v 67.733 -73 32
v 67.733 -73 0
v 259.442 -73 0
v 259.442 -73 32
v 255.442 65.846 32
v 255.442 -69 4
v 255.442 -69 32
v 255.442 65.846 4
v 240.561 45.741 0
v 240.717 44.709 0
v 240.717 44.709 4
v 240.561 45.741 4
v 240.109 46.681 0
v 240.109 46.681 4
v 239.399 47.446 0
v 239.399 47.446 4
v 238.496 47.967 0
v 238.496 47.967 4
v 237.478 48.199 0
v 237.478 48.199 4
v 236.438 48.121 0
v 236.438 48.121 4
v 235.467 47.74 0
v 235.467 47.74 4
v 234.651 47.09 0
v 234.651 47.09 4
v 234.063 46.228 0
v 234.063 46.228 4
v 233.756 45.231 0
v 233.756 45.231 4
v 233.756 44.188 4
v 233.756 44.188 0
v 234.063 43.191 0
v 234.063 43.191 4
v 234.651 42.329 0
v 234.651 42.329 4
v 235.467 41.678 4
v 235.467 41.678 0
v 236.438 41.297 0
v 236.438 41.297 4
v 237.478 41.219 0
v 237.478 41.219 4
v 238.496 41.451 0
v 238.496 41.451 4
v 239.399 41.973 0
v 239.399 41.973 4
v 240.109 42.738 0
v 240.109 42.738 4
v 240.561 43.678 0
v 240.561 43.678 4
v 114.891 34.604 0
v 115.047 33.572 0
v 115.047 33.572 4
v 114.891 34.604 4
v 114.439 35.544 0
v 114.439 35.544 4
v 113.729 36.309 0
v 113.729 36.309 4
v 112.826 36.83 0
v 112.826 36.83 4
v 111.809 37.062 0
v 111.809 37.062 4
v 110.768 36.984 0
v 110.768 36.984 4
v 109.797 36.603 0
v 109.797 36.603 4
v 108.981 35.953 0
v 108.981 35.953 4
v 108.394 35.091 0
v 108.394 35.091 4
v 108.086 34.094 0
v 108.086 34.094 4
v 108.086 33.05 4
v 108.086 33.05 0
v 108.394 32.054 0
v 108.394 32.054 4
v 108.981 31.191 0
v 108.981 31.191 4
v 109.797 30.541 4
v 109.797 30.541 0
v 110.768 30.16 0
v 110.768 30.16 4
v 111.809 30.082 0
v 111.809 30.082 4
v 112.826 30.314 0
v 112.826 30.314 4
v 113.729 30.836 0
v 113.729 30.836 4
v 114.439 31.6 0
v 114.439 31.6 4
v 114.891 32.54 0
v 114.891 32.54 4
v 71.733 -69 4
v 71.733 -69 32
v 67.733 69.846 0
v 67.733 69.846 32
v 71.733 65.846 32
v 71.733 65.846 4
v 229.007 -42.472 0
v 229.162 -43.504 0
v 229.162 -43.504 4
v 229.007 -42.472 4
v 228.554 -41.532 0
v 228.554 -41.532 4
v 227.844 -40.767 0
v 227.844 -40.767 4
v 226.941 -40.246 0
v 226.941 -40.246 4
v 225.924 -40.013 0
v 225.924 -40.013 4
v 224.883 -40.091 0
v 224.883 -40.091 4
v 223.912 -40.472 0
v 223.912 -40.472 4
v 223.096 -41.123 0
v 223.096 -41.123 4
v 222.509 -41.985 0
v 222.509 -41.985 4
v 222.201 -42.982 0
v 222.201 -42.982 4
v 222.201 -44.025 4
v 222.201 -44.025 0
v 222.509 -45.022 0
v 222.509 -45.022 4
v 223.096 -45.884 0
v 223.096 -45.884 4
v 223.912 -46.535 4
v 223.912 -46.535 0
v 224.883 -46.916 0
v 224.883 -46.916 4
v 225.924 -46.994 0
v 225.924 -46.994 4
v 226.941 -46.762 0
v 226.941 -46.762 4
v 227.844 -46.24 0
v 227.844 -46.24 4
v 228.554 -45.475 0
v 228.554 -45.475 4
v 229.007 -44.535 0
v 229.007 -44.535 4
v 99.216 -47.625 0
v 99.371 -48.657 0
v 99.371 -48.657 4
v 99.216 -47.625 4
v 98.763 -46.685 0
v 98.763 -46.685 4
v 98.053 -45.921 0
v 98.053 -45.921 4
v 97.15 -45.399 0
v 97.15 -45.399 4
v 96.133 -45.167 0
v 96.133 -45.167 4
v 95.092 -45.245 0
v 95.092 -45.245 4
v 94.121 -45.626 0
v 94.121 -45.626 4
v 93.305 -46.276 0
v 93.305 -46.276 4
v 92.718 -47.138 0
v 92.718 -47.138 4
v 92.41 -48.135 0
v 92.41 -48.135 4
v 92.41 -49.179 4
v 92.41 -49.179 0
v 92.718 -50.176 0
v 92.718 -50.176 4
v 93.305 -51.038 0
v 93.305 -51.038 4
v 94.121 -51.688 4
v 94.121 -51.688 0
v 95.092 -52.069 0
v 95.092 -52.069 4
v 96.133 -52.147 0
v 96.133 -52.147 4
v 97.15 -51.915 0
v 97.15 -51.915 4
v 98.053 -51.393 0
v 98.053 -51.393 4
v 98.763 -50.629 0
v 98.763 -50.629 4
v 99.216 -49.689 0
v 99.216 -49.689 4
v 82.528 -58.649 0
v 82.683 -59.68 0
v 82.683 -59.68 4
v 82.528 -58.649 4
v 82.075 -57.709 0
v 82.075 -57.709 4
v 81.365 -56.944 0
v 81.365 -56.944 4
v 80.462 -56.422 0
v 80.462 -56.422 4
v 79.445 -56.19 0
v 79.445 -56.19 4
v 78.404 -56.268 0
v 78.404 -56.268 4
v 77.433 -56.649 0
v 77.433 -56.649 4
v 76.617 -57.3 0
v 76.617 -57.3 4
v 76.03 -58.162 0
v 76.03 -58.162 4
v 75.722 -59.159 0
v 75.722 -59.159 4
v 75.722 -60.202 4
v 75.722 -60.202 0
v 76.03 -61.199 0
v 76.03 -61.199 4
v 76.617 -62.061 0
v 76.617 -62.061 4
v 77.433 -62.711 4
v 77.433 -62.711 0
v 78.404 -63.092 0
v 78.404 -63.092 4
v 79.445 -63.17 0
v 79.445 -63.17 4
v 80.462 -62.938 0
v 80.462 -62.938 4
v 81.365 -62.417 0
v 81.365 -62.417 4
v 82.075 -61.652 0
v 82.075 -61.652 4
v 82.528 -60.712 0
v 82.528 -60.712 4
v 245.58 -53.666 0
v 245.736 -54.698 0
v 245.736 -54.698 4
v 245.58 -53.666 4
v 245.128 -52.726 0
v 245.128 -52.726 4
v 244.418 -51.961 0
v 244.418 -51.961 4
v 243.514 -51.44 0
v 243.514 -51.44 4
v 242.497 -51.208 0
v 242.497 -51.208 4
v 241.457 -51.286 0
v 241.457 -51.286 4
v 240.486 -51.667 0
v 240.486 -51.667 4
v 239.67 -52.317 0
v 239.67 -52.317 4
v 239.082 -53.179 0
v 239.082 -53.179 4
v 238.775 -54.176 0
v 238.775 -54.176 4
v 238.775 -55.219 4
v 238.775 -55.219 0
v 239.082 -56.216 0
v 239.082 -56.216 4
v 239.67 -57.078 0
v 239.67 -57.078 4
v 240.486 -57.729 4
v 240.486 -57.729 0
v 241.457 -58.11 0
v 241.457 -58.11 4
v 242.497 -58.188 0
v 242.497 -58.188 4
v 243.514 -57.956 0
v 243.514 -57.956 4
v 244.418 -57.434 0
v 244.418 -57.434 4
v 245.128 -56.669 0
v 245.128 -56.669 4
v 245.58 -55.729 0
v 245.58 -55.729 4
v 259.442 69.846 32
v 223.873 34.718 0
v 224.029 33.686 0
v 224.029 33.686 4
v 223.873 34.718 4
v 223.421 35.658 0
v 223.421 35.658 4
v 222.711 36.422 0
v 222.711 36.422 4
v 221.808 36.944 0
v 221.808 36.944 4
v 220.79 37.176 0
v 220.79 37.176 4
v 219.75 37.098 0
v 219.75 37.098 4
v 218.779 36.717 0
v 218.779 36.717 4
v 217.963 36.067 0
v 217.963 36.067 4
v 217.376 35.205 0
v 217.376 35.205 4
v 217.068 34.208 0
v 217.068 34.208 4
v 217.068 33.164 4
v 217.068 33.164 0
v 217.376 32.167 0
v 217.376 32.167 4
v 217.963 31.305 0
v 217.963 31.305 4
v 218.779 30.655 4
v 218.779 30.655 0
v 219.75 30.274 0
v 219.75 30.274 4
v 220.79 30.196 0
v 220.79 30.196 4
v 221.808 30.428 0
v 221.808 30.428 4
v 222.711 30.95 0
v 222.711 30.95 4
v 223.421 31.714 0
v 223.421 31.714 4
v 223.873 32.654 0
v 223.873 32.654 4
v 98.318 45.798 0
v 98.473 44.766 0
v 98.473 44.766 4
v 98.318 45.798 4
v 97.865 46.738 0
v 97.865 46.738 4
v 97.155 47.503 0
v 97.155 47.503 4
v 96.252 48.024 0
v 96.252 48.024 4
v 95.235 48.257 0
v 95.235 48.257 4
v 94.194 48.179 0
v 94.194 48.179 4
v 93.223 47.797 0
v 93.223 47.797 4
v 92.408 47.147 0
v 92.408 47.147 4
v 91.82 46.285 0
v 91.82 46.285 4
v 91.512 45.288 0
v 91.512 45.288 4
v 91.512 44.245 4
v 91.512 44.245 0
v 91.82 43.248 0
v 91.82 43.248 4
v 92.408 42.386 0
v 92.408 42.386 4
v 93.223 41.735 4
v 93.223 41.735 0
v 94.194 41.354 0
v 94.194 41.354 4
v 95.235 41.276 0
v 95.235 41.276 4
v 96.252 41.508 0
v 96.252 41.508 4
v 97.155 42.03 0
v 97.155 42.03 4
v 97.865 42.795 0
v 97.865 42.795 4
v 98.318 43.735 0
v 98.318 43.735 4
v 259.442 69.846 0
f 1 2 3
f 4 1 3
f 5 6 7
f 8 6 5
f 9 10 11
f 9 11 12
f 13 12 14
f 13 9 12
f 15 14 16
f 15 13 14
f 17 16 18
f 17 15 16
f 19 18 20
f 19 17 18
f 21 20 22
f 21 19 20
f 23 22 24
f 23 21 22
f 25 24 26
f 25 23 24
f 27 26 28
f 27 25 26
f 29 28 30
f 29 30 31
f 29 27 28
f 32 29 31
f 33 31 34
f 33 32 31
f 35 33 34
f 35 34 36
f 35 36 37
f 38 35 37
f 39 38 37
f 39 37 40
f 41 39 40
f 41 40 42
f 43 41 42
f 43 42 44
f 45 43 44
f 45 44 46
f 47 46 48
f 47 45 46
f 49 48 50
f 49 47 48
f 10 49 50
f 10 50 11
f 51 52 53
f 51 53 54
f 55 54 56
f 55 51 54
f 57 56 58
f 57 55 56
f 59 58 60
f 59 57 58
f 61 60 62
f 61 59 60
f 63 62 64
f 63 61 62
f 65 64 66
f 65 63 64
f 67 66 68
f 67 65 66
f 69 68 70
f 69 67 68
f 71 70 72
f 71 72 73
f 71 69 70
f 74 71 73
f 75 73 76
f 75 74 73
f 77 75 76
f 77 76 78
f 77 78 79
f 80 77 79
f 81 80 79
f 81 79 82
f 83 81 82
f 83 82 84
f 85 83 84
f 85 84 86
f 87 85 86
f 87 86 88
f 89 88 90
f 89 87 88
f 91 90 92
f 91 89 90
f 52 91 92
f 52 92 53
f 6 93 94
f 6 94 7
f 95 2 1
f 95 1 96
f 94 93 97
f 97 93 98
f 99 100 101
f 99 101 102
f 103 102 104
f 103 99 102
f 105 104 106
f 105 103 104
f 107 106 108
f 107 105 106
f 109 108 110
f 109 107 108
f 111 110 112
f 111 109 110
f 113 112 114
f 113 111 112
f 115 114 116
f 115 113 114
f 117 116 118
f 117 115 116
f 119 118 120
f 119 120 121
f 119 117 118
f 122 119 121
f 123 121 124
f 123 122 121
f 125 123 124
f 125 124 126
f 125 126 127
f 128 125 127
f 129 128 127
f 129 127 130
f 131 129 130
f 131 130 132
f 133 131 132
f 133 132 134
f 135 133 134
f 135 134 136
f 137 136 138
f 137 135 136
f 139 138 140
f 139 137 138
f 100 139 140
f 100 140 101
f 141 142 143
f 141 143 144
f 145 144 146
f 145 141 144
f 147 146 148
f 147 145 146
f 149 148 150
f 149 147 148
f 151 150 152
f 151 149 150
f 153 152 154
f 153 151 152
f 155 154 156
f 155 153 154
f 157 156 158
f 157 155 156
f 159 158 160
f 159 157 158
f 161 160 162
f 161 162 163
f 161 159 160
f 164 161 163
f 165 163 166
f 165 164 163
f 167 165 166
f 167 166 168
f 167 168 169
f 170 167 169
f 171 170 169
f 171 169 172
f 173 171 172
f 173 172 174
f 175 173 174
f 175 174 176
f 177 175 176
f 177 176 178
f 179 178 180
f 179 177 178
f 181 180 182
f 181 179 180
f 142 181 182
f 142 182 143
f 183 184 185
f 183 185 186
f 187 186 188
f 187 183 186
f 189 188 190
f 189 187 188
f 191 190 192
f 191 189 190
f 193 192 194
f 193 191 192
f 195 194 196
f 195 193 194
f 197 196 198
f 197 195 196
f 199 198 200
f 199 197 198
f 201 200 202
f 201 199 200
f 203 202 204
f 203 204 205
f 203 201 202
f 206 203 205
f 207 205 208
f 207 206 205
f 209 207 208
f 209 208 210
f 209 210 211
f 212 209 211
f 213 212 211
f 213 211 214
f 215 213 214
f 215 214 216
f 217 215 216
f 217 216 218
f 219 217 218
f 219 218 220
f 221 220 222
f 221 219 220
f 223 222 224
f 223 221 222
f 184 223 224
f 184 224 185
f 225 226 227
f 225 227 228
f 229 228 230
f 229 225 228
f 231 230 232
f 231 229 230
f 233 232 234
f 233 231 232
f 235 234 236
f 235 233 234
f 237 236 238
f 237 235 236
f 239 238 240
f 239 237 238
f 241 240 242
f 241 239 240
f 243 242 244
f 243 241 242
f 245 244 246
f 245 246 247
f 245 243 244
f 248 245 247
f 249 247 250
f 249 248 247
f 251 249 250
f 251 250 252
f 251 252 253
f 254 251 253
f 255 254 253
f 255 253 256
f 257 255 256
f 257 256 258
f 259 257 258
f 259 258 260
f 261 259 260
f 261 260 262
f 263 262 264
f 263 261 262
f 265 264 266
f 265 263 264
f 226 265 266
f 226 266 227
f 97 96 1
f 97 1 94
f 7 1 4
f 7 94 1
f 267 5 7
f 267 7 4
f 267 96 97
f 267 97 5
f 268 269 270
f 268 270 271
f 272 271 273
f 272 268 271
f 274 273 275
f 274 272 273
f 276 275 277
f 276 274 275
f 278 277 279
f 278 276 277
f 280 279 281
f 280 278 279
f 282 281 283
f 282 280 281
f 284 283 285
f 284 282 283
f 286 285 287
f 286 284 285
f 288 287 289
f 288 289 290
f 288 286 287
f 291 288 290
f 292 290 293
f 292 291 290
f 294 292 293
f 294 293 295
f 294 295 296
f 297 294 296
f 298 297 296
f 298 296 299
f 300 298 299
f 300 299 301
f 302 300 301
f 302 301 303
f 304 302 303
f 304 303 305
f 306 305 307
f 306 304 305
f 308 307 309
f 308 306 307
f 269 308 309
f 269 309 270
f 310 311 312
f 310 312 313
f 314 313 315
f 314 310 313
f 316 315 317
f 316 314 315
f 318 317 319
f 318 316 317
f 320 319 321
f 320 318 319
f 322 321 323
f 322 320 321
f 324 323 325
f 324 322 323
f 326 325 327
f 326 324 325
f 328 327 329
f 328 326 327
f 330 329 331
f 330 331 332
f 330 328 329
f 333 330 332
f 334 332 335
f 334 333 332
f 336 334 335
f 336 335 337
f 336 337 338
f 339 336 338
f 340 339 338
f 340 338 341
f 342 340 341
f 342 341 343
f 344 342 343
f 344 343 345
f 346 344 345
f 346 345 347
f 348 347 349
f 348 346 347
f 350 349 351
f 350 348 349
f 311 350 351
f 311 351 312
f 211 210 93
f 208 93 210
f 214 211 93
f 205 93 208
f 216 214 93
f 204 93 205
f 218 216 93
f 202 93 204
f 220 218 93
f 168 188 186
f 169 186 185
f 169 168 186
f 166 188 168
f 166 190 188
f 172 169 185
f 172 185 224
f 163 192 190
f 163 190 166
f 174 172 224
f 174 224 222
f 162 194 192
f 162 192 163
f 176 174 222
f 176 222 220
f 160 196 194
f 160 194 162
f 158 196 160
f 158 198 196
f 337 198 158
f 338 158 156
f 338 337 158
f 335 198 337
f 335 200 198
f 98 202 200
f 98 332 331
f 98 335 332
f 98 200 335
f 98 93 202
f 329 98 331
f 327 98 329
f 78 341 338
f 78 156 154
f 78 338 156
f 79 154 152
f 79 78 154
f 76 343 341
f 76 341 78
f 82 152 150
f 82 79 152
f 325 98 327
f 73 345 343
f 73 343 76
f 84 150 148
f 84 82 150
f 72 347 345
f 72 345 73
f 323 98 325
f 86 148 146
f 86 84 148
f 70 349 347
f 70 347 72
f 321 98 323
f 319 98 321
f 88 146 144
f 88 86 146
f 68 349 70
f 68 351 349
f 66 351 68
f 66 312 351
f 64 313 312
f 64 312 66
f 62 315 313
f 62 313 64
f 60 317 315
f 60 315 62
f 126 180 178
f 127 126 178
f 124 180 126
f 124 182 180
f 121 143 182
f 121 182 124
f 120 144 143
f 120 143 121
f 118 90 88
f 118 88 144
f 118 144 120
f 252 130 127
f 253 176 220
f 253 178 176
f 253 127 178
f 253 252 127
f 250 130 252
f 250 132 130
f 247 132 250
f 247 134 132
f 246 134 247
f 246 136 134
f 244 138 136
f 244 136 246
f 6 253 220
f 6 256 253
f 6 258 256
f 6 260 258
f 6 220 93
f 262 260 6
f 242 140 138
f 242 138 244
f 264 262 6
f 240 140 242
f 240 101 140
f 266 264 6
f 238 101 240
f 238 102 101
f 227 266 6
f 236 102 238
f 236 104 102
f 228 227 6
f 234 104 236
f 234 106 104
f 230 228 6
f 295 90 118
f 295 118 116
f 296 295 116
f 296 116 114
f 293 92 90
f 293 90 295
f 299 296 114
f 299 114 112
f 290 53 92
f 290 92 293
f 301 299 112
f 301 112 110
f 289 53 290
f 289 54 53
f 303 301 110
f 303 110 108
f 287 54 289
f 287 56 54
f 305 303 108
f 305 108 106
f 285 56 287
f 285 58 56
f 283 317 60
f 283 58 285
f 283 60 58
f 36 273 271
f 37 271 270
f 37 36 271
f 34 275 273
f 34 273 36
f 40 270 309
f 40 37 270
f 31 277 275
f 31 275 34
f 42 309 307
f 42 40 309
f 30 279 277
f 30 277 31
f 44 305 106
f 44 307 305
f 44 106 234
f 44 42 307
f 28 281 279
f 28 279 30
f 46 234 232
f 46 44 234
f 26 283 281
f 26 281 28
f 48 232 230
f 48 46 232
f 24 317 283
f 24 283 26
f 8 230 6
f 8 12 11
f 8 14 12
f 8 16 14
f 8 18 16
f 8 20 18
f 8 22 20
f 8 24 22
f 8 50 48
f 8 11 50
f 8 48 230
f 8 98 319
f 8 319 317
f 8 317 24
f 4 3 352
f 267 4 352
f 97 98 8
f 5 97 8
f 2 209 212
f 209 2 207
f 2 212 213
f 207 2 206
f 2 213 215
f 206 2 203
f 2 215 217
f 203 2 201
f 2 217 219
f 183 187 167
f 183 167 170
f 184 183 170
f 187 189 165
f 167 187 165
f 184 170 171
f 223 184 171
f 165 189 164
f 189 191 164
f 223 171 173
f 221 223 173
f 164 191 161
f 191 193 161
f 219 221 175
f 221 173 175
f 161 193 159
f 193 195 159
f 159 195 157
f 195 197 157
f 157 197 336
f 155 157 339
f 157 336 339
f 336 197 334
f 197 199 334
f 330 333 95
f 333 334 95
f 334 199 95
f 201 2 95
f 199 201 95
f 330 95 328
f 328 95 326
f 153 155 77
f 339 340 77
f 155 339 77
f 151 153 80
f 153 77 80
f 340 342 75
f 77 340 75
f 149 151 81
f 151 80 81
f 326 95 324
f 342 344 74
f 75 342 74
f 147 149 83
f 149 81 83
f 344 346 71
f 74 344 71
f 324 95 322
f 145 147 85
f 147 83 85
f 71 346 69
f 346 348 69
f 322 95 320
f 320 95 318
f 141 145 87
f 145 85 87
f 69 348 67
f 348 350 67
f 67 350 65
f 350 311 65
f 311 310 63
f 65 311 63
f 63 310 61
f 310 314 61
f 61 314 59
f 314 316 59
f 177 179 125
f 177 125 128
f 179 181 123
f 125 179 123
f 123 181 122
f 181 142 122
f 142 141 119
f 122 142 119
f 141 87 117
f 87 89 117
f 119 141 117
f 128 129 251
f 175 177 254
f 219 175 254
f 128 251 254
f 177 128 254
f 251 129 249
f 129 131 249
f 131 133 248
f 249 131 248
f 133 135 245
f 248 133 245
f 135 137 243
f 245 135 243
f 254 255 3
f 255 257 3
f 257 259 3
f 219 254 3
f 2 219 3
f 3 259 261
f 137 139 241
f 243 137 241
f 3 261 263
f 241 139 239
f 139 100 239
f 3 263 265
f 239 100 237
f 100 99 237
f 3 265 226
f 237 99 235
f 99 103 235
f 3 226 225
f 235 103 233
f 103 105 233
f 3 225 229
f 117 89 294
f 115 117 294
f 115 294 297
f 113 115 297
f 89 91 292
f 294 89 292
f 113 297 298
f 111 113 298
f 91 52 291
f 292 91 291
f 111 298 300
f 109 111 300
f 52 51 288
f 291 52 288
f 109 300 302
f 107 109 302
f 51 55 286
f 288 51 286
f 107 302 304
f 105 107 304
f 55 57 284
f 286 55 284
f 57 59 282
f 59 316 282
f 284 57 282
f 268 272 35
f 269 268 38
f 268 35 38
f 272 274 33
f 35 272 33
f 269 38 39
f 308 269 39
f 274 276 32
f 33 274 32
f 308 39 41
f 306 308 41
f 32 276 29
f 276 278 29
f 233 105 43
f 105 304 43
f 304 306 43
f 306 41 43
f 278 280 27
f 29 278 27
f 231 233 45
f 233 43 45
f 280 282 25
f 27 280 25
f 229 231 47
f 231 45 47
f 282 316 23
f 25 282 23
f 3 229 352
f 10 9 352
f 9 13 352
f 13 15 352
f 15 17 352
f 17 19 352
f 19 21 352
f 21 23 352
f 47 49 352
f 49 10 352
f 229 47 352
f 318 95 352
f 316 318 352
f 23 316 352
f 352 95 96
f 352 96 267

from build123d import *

# Parameters (mm, degrees)
SKETCH1_W           = 191.709364395
SKETCH1_H           = 142.845926684
SKETCH1_R           = 3.5
BOSS_EXTRUDE2_DEPTH = 4
SKETCH1_5_W         = 183.709364395
SKETCH1_5_H         = 134.845926684
BOSS_EXTRUDE3_DEPTH = 32


with BuildPart() as part:
    # Sketch1 → Boss-Extrude2 (new body)
    with BuildSketch(Plane.XY):
        with Locations((163.587328245, -1.577036658)):
            Rectangle(SKETCH1_W, SKETCH1_H)
        with Locations((94.973221843, 44.766341696)):
            Circle(SKETCH1_R, mode=Mode.SUBTRACT)
        with Locations((111.546962379, 33.572096538)):
            Circle(SKETCH1_R, mode=Mode.SUBTRACT)
        with Locations((220.528931491, 33.685981472)):
            Circle(SKETCH1_R, mode=Mode.SUBTRACT)
        with Locations((237.21688879, 44.709233314)):
            Circle(SKETCH1_R, mode=Mode.SUBTRACT)
        with Locations((79.183060399, -59.680217036)):
            Circle(SKETCH1_R, mode=Mode.SUBTRACT)
        with Locations((95.871017698, -48.656965194)):
            Circle(SKETCH1_R, mode=Mode.SUBTRACT)
        with Locations((242.235781203, -54.69781901)):
            Circle(SKETCH1_R, mode=Mode.SUBTRACT)
        with Locations((225.662040668, -43.503573852)):
            Circle(SKETCH1_R, mode=Mode.SUBTRACT)
    extrude(amount=BOSS_EXTRUDE2_DEPTH)

    # Sketch1<5> → Boss-Extrude3 (add)
    with BuildSketch(Plane.XY):
        Polygon((259.442010442, -73), (259.442010442, -1.577036658), (259.442010442, 69.845926684), (67.732646047, 69.845926684), (67.732646047, -73), (163.587328244, -73), align=None)
        with Locations((163.587328245, -1.577036658)):
            Rectangle(SKETCH1_5_W, SKETCH1_5_H, mode=Mode.SUBTRACT)
    extrude(amount=BOSS_EXTRUDE3_DEPTH)


solid = part.part
